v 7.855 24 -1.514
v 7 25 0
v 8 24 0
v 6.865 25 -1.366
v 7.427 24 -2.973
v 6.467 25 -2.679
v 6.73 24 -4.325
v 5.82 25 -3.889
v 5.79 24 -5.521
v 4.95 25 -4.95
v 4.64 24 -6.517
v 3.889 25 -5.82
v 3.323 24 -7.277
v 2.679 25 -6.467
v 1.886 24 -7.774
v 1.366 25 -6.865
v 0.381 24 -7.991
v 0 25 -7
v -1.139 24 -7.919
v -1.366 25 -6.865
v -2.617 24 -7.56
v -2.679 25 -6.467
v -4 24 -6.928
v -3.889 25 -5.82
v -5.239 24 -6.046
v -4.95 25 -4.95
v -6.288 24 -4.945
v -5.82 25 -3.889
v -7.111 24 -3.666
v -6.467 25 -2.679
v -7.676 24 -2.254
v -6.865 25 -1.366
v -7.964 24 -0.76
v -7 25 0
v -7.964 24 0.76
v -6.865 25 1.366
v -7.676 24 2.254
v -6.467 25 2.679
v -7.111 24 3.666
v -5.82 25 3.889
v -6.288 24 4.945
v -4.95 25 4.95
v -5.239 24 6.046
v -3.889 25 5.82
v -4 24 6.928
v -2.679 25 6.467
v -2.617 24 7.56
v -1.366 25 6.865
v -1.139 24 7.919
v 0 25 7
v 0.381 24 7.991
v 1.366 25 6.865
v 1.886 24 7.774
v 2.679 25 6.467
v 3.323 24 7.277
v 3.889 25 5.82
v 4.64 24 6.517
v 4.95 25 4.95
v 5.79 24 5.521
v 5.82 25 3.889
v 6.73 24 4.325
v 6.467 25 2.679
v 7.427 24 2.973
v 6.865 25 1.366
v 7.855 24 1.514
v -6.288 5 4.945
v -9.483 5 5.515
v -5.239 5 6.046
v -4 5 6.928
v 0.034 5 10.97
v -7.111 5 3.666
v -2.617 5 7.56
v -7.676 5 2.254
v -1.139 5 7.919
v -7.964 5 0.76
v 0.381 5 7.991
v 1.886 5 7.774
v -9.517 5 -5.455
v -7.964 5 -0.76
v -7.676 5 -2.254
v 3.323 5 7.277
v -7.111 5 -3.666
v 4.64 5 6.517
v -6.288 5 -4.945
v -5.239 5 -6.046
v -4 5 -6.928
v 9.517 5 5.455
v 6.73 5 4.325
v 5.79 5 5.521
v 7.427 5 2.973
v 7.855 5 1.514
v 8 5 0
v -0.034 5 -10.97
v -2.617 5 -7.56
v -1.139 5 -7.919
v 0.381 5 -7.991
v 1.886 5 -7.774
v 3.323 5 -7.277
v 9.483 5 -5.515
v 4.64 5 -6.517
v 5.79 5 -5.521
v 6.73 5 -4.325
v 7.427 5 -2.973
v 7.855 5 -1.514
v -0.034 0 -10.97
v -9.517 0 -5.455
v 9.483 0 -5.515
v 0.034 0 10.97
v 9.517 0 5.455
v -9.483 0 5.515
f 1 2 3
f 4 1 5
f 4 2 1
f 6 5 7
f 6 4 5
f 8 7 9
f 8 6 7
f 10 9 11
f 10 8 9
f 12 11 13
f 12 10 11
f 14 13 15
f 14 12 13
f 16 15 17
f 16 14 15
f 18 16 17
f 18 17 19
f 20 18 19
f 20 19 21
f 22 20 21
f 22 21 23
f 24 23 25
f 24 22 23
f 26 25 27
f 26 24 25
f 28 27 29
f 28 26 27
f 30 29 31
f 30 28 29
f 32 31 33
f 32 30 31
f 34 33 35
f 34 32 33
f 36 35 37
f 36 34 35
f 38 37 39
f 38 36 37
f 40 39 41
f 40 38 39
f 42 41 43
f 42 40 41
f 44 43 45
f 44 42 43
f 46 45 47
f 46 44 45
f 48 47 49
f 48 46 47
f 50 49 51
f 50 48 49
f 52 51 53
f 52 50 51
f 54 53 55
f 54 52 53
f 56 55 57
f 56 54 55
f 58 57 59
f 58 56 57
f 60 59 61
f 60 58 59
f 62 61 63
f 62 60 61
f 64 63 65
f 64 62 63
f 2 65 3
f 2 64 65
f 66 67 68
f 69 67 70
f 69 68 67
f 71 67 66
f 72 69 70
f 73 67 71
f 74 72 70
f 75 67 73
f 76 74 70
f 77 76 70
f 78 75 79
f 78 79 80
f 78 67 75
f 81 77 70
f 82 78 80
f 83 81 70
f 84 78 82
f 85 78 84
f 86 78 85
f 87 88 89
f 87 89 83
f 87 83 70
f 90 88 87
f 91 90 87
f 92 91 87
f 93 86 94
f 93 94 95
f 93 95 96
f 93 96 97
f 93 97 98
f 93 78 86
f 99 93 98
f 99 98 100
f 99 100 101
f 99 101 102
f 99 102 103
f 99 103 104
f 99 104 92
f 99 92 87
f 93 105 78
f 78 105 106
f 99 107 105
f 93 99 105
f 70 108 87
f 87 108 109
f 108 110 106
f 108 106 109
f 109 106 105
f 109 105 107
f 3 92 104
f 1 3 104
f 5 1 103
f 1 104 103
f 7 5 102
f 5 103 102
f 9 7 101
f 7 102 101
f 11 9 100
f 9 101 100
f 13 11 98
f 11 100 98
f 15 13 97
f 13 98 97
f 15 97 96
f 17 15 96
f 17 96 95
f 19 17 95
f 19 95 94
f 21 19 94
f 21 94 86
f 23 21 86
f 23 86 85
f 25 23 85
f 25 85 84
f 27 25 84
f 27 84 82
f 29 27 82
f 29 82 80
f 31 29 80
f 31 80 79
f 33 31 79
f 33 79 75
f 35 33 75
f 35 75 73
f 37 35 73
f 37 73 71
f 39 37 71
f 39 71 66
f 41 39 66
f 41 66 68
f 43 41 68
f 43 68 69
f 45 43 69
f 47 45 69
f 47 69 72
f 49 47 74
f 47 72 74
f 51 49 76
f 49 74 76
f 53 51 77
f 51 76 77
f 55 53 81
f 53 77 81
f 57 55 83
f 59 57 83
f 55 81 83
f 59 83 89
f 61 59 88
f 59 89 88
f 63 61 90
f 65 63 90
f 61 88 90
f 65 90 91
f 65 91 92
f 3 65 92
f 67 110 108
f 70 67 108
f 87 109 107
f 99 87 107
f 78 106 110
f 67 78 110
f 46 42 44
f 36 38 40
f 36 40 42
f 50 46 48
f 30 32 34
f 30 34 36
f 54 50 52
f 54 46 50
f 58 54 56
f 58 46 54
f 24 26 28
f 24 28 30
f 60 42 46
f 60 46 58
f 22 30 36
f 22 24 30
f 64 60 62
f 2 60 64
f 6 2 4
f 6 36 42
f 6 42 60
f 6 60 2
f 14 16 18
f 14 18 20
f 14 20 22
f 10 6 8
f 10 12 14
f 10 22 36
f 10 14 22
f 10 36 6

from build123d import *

# Parameters (mm, degrees)
BOSS_EXTRUDE1_DEPTH = 5
SKETCH2_R           = 8
BOSS_EXTRUDE2_DEPTH = 25
CHAMFER1_SIZE       = 1


with BuildPart() as part:
    # Sketch1 → Boss-Extrude1 (new body)
    with BuildSketch(Plane(origin=(0, 0, 0), x_dir=(1, 0, 0), z_dir=(0, 1, 0))):
        Polygon((9.517177276, -5.454967463), (9.482729038, 5.514633562), (-0.034448238, 10.969601025), (-9.517177276, 5.454967463), (-9.482729038, -5.514633562), (0.034448238, -10.969601025), align=None)
    extrude(amount=BOSS_EXTRUDE1_DEPTH)

    # Sketch2 → Boss-Extrude2 (add)
    with BuildSketch(Plane(origin=(0, 0, 0), x_dir=(1, 0, 0), z_dir=(0, 1, 0))):
        Circle(SKETCH2_R)
    extrude(amount=BOSS_EXTRUDE2_DEPTH)

    # Chamfer1
    chamfer1_edges = [part.edges().sort_by_distance(p)[0] for p in [
        (-8, 25, 0),
    ]]
    chamfer(chamfer1_edges, length=CHAMFER1_SIZE)


solid = part.part
